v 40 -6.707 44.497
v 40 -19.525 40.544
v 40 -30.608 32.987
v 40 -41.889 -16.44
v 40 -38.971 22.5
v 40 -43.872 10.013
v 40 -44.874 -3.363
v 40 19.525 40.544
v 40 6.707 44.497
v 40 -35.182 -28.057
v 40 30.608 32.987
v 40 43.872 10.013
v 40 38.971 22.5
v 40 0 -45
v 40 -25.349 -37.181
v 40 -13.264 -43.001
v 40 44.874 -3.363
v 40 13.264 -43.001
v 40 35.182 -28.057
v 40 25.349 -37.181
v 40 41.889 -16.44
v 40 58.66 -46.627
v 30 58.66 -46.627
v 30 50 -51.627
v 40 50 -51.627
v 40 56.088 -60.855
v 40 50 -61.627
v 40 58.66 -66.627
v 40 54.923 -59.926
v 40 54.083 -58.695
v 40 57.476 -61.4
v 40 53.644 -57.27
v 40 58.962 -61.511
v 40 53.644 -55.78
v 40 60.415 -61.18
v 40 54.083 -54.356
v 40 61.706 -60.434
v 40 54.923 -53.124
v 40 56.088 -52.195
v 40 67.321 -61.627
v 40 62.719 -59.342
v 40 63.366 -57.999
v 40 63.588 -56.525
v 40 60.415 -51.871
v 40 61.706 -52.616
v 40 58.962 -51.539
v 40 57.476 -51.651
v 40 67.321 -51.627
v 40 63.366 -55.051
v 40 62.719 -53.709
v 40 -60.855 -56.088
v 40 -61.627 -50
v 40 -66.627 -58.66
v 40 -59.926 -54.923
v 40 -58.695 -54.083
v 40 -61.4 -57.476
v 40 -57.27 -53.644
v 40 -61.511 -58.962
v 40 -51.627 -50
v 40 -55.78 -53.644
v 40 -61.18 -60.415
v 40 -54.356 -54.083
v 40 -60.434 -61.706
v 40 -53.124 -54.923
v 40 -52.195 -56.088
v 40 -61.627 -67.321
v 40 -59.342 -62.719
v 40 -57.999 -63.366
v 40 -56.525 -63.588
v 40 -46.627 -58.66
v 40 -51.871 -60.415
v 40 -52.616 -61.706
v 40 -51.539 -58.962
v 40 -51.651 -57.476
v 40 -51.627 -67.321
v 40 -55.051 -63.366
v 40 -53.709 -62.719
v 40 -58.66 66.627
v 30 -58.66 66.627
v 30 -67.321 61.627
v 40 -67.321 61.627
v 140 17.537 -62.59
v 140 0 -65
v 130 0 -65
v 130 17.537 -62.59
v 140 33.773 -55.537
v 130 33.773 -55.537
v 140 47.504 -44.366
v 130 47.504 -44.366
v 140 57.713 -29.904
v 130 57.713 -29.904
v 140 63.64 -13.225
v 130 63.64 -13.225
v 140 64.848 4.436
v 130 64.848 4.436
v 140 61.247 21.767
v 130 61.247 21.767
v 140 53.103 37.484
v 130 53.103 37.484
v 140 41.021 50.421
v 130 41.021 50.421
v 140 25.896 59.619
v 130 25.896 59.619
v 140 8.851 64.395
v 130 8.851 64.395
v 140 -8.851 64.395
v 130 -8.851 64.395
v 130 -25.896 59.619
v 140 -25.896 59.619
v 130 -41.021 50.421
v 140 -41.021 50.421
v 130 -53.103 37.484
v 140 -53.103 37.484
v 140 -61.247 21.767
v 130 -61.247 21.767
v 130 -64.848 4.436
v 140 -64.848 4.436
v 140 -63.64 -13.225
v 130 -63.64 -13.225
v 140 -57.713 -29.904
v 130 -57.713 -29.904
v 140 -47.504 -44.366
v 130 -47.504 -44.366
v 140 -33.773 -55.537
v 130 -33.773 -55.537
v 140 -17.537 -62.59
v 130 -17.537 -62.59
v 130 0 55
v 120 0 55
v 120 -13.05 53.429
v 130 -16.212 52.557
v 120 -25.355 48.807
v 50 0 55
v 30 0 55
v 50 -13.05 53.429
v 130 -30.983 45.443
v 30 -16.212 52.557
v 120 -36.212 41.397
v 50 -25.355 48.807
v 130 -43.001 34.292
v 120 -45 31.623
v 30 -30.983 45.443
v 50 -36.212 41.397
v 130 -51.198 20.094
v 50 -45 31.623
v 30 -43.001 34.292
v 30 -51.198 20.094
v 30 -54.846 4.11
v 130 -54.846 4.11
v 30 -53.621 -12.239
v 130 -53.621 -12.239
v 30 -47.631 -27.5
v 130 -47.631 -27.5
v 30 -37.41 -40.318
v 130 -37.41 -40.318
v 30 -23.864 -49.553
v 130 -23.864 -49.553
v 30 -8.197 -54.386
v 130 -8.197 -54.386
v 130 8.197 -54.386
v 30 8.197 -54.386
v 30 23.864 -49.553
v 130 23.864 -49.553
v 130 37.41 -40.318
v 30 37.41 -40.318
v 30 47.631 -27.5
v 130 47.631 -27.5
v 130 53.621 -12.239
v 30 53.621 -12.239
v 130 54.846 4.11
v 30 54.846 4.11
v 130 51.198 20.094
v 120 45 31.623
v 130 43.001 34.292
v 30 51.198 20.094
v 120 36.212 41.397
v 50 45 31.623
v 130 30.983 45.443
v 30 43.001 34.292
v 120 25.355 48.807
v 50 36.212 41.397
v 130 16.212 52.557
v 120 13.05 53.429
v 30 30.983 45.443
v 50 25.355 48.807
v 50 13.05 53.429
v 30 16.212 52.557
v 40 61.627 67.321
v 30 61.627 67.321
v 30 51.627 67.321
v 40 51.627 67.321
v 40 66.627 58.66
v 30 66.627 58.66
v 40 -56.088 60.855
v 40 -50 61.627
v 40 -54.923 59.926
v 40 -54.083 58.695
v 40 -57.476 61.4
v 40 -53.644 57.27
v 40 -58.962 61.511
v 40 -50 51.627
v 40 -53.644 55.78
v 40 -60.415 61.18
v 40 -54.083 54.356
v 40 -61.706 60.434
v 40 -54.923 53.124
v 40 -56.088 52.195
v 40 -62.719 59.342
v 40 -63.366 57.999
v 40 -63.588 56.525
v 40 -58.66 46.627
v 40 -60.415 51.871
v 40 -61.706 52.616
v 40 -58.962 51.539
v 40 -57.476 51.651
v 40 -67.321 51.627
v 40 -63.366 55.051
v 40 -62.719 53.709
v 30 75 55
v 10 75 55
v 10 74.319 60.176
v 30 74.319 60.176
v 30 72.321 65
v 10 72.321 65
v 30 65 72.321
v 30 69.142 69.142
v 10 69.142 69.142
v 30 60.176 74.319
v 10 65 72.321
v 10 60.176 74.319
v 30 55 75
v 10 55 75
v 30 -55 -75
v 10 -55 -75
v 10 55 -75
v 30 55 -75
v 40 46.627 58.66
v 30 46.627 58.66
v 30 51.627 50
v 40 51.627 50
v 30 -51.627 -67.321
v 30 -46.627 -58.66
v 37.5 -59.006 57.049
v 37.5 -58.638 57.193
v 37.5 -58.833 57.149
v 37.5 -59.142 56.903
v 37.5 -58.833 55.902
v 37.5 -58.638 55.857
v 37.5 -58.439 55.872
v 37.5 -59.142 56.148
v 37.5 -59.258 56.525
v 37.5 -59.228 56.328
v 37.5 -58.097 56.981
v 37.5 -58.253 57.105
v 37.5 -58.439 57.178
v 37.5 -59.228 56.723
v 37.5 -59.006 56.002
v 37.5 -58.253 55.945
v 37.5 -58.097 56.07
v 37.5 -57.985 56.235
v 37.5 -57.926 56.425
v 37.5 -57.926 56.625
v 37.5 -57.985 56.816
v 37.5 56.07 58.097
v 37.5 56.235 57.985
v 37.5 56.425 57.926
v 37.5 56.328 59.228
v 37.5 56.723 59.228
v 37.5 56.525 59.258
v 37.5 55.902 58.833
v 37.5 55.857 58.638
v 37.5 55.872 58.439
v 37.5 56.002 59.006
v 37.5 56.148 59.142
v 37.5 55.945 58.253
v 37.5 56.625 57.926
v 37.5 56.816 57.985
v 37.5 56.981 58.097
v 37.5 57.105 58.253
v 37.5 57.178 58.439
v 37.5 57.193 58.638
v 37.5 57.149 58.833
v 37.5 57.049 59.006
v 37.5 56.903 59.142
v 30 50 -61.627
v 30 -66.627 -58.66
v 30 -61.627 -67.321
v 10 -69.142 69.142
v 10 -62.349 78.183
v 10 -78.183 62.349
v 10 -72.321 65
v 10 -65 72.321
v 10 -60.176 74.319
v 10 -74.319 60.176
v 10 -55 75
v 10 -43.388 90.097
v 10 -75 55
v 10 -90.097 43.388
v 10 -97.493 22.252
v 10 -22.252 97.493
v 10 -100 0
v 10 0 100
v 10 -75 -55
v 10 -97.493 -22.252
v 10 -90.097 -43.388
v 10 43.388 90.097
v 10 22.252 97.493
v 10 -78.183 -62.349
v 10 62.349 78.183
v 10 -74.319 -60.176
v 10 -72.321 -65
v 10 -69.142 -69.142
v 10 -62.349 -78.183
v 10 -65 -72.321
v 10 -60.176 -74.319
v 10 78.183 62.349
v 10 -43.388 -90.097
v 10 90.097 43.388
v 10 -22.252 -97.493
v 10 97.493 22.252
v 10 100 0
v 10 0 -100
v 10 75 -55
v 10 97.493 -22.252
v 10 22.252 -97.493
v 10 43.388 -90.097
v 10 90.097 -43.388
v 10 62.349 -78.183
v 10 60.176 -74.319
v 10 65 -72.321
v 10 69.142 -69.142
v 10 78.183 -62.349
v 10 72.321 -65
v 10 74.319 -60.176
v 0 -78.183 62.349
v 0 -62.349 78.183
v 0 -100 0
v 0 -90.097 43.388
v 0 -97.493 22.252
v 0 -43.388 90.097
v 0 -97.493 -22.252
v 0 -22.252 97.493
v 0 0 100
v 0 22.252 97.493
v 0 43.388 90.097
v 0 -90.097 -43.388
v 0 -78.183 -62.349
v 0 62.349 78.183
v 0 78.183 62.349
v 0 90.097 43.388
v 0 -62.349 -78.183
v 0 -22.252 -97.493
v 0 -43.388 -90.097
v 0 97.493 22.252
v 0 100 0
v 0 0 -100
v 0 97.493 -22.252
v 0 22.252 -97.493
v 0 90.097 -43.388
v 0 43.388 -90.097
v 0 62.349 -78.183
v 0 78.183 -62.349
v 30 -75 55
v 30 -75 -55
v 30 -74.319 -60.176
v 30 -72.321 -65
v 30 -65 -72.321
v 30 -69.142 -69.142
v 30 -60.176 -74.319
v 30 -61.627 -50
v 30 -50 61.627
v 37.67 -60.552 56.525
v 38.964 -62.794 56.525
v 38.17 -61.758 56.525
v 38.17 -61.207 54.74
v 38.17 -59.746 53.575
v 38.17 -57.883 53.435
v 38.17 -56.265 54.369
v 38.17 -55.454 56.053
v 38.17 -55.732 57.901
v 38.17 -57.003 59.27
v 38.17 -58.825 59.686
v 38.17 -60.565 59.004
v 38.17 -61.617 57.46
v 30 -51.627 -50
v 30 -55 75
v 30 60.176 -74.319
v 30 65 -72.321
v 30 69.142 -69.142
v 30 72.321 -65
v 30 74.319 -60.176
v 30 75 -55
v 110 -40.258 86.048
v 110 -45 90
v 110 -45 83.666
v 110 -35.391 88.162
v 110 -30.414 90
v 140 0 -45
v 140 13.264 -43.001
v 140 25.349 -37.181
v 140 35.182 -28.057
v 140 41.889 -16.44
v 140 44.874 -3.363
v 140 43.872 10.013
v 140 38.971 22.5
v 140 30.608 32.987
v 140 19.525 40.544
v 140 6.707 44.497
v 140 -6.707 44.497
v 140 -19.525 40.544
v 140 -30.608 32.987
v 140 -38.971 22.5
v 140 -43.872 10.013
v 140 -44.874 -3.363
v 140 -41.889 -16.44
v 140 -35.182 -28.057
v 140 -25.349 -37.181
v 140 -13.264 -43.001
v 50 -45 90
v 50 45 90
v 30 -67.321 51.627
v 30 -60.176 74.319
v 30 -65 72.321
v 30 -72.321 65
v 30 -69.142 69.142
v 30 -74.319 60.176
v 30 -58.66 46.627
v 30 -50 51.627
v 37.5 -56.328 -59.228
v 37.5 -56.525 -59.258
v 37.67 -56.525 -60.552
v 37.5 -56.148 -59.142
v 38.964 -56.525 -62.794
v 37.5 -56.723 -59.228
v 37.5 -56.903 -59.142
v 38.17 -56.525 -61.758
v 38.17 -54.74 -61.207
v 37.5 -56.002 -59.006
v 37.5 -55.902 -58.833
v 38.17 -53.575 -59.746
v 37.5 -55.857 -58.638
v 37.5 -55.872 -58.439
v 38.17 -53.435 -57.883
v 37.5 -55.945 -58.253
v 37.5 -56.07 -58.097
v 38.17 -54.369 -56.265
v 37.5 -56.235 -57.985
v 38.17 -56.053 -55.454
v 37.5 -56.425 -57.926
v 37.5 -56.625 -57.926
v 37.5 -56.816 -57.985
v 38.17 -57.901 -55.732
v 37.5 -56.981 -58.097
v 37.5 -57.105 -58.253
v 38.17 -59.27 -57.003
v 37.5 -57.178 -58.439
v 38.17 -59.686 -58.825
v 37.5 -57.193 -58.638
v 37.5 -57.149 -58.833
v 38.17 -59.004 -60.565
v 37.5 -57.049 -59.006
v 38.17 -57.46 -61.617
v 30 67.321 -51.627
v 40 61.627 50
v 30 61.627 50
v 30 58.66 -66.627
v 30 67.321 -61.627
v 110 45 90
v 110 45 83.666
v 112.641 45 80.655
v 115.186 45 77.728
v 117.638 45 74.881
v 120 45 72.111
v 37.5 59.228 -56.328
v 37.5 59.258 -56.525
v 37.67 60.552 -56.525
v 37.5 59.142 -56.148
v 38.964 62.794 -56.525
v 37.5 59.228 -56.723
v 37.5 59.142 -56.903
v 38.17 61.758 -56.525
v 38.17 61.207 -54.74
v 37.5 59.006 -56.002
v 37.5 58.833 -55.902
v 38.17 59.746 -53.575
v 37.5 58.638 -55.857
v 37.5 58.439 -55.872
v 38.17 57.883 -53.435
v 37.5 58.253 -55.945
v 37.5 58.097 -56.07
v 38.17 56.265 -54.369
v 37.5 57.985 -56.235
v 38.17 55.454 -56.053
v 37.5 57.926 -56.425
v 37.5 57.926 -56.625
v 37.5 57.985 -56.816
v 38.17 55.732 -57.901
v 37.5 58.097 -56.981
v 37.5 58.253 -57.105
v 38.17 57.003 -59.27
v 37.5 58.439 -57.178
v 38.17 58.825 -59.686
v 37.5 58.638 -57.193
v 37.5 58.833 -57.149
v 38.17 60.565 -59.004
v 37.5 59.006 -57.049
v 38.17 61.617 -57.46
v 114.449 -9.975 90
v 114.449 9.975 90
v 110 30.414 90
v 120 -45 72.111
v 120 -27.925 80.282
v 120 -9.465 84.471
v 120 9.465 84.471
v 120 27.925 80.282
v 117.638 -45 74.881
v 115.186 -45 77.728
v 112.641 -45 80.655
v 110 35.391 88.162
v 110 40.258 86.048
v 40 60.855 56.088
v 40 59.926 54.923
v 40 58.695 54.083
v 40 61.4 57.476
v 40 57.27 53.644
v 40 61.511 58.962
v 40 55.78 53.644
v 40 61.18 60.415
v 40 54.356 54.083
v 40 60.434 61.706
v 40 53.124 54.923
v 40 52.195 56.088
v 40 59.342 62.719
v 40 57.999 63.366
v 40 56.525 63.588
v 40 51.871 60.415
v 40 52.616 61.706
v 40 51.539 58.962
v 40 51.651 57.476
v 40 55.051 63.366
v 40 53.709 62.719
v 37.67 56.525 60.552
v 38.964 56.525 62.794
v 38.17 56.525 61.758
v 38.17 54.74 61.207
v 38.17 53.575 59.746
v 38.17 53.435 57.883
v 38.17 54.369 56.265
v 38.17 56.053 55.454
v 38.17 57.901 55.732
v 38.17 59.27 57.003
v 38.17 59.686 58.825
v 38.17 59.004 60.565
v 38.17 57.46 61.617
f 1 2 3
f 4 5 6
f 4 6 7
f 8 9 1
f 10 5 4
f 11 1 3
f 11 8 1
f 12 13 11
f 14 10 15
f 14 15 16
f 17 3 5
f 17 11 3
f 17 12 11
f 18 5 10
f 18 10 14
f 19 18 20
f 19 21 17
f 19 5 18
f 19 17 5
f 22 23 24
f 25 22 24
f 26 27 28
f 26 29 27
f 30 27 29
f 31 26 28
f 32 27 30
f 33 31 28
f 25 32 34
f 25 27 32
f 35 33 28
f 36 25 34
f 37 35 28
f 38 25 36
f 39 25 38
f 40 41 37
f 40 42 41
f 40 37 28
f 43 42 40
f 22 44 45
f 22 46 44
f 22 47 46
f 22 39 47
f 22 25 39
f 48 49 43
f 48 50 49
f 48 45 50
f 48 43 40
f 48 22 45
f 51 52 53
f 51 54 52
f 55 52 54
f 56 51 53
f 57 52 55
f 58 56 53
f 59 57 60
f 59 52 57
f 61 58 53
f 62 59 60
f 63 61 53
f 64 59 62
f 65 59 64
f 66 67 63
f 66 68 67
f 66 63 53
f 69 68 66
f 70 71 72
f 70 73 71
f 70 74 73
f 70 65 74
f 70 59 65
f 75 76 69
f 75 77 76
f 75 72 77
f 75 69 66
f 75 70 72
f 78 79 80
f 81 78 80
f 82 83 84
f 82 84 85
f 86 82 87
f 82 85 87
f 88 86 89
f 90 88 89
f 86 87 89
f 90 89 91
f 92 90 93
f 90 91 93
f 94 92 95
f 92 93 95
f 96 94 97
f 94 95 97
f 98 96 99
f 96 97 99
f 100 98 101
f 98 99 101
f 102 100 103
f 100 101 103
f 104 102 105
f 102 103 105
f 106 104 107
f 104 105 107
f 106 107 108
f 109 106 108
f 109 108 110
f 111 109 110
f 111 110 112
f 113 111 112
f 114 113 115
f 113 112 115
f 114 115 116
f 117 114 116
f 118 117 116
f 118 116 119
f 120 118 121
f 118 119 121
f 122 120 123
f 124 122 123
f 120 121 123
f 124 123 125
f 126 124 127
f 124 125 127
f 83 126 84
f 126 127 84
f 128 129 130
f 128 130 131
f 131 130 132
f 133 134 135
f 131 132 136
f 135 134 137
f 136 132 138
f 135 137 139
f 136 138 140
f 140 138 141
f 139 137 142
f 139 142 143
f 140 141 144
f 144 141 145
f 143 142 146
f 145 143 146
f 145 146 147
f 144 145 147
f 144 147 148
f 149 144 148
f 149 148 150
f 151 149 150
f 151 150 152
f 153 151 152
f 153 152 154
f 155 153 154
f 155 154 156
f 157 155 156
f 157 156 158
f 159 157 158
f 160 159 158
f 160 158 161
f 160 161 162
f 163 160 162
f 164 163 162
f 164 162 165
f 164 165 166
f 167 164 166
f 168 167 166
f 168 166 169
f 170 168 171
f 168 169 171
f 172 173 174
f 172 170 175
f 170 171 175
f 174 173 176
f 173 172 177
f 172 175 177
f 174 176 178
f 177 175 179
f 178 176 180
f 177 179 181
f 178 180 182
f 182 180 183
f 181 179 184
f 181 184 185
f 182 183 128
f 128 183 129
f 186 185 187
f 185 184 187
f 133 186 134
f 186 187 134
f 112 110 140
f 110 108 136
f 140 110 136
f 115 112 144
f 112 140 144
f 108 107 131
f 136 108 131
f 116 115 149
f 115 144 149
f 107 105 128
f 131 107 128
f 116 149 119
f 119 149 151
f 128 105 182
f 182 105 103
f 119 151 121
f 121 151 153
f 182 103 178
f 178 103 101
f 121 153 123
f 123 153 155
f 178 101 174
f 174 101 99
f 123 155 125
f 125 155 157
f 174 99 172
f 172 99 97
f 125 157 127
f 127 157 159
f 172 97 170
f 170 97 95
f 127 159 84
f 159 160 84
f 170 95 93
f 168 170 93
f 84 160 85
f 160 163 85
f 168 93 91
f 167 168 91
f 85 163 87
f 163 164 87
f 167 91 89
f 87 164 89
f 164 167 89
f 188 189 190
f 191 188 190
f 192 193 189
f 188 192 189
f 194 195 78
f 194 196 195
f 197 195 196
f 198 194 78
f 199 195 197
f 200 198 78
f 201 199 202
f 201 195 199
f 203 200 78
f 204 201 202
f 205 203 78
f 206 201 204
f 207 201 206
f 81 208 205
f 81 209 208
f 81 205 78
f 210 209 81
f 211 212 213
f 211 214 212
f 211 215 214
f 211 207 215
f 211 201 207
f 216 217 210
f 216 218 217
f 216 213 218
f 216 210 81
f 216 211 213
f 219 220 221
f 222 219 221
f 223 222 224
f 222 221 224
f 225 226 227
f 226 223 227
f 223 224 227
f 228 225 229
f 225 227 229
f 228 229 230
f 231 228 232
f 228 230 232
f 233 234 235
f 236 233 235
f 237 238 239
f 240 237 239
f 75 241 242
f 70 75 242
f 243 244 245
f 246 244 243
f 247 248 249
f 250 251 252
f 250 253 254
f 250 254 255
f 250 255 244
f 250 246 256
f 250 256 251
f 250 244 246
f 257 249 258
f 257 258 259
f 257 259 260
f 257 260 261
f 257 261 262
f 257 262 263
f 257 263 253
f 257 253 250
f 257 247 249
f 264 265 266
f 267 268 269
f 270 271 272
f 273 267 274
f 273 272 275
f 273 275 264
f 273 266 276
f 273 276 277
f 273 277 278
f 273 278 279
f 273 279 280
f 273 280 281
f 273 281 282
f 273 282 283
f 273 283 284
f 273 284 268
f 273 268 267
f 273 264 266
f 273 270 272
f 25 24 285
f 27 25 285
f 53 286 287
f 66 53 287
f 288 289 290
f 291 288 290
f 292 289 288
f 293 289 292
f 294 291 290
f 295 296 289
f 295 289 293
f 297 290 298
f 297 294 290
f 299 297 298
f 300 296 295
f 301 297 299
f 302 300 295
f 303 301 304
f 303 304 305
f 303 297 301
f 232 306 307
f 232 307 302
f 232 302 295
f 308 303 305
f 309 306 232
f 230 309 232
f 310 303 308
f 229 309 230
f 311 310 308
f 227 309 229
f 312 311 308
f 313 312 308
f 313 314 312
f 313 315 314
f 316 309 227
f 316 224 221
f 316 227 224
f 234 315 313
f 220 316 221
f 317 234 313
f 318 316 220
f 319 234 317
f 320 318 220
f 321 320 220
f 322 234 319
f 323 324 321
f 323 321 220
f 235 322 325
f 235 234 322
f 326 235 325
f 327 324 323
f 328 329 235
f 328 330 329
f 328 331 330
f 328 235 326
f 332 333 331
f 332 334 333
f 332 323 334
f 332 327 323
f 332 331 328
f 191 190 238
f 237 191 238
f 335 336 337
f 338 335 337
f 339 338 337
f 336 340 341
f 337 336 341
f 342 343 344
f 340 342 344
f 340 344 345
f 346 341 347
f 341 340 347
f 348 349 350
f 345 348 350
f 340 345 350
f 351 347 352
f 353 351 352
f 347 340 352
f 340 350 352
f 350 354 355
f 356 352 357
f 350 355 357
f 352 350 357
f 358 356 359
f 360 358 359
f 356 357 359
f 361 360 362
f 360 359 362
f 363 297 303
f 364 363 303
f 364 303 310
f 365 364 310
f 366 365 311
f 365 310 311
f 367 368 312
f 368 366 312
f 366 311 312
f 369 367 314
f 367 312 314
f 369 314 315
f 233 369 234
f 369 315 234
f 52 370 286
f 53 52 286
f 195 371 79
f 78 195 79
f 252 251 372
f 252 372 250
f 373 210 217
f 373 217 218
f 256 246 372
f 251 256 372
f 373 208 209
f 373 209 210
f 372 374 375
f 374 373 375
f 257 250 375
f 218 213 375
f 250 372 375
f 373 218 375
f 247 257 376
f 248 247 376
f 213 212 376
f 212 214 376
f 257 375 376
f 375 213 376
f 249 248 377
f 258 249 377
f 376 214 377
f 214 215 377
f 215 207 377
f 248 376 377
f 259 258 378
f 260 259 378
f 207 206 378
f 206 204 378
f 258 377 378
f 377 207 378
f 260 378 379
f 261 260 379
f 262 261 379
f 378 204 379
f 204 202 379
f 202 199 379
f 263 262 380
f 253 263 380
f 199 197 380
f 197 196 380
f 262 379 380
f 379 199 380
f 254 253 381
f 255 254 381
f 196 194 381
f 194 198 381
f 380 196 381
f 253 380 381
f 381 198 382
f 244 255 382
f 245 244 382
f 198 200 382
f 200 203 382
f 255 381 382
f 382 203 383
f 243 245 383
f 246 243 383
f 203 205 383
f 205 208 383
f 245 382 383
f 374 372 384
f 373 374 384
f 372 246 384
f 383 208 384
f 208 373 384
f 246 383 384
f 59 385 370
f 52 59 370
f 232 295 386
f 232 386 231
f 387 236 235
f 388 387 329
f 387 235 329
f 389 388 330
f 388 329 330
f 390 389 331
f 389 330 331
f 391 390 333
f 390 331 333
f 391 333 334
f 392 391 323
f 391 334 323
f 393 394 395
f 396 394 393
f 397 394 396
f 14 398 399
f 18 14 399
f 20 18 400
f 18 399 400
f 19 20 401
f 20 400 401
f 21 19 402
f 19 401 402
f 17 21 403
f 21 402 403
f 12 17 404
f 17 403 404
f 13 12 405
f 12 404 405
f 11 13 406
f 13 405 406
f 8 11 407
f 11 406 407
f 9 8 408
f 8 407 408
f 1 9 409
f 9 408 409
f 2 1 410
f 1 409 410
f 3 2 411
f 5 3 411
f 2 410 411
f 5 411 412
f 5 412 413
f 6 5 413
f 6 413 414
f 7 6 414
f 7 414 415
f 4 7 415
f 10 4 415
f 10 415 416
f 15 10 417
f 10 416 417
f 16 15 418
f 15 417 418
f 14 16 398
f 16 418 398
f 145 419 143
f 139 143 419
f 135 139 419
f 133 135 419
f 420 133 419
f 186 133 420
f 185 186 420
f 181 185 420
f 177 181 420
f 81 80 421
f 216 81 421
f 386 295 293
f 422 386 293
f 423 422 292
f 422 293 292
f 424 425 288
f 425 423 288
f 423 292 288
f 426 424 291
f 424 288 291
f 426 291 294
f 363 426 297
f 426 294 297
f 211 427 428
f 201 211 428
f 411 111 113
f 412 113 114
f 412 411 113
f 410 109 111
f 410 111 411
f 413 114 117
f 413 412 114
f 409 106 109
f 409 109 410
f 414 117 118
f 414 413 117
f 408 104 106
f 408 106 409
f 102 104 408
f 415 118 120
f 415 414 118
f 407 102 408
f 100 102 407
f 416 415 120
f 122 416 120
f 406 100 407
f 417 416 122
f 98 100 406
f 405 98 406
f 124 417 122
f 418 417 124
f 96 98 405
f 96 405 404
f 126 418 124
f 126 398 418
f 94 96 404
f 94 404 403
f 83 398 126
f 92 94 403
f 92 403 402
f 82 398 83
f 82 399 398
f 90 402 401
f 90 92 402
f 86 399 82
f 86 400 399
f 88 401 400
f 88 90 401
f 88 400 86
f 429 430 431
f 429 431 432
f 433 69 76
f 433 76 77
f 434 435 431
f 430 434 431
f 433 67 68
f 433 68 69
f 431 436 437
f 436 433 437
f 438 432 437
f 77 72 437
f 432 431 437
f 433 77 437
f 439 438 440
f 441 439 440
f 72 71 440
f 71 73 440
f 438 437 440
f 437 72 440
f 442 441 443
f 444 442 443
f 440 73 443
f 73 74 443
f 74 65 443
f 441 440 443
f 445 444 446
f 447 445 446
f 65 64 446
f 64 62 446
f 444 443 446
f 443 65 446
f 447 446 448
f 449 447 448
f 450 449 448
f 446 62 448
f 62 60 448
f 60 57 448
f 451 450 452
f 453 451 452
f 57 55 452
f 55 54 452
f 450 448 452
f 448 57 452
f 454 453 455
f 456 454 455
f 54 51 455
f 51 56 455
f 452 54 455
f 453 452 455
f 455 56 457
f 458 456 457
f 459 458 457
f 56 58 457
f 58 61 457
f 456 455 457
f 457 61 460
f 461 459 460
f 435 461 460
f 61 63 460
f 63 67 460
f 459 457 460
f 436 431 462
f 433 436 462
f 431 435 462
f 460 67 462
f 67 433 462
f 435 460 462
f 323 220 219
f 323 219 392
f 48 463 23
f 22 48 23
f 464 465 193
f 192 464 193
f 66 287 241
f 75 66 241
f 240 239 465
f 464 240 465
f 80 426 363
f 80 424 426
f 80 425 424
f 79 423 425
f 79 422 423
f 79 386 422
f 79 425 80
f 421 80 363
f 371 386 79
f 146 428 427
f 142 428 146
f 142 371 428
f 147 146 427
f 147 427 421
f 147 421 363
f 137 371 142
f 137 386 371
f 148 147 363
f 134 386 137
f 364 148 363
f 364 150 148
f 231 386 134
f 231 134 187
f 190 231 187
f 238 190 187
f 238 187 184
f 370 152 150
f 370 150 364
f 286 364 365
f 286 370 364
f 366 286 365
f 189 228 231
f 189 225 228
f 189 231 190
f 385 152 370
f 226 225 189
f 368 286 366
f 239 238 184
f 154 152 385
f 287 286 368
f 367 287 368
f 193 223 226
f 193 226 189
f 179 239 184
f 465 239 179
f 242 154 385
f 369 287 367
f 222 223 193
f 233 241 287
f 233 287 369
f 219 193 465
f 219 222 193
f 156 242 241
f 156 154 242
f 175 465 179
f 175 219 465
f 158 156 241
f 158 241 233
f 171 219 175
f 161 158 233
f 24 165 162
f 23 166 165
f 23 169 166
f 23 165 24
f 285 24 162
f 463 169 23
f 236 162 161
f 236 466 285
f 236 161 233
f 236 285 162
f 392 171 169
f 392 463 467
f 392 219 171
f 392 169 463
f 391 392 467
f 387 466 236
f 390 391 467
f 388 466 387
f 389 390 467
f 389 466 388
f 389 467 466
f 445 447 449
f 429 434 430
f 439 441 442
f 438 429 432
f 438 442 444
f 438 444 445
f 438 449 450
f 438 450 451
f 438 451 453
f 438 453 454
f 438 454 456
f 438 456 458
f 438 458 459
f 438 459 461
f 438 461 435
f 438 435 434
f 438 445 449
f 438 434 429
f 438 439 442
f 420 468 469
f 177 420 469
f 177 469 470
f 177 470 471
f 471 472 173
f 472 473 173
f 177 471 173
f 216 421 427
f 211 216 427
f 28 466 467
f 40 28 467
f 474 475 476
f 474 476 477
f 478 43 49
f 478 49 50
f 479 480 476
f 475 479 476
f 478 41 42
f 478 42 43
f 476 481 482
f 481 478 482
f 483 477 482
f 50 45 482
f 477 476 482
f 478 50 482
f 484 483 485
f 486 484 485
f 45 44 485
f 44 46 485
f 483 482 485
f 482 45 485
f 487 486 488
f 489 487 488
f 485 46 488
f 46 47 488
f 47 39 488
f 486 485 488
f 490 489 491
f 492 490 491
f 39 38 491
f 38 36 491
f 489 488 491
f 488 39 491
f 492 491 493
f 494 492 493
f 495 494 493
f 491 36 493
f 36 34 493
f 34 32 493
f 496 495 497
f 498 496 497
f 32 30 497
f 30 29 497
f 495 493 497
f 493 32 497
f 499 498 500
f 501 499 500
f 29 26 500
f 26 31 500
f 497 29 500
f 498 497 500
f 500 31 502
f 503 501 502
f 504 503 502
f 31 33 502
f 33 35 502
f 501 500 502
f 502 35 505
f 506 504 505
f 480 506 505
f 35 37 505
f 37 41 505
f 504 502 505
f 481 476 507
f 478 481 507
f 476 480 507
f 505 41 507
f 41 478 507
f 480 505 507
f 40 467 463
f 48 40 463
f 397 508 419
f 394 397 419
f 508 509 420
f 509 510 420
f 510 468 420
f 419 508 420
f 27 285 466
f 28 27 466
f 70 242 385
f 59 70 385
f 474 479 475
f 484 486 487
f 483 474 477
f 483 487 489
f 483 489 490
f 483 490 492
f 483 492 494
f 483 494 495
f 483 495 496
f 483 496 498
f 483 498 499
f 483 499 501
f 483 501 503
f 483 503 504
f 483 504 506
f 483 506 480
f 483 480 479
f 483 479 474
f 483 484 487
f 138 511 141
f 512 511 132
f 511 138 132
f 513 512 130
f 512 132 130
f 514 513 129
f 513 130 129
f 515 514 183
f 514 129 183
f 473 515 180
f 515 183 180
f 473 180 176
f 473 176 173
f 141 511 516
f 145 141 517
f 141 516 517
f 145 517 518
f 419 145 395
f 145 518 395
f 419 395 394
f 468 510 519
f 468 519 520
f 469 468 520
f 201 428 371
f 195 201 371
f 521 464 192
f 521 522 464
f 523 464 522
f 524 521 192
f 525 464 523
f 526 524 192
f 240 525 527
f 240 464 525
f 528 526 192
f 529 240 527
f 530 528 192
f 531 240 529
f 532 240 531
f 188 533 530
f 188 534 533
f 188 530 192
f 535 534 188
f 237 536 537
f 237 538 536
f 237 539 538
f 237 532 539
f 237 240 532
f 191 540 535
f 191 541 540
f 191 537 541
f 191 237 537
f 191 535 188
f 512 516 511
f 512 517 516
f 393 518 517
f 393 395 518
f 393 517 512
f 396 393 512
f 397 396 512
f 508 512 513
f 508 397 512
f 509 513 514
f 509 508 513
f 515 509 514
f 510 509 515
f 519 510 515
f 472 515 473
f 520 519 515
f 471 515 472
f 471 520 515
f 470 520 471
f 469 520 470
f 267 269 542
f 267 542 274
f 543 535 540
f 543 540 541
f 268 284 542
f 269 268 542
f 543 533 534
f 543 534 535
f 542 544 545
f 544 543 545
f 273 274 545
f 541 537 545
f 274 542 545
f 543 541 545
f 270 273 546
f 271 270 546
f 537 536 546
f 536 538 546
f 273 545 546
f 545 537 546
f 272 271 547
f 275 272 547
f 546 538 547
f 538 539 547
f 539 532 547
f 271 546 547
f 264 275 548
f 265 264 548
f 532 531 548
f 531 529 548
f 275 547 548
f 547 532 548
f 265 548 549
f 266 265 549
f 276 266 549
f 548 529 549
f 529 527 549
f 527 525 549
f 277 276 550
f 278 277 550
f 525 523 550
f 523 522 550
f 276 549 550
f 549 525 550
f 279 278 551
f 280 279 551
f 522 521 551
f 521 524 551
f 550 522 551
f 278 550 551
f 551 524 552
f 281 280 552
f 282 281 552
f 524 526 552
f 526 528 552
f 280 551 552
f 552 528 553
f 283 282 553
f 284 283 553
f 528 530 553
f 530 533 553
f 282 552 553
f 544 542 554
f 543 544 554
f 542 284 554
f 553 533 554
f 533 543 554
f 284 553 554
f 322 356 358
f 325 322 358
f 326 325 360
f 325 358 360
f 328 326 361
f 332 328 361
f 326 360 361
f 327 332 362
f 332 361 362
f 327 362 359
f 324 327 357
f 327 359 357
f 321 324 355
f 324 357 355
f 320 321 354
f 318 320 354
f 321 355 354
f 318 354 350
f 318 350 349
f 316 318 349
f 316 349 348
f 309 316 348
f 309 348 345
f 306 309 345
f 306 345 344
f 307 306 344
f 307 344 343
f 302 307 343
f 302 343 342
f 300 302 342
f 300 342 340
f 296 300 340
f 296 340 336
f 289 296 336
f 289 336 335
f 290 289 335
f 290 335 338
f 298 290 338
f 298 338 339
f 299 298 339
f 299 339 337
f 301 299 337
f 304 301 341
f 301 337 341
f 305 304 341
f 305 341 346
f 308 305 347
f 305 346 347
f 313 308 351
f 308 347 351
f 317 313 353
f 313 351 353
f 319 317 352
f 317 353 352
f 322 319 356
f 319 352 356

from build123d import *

# Parameters (mm, degrees)
SKETCH1_R                = 100
BOSS_EXTRUDE1_DEPTH      = 10
SKETCH2_W                = 150
SKETCH2_H                = 150
BOSS_EXTRUDE2_DEPTH      = 20
FILLET1_R                = 20
SKETCH3_R                = 55
BOSS_EXTRUDE3_DEPTH      = 100
SKETCH4_R                = 65
BOSS_EXTRUDE4_DEPTH      = 10
SKETCH5_W                = 70
SKETCH5_H                = 90
BOSS_EXTRUDE5_DEPTH      = 90
CUT_EXTRUDE1_DEPTH       = 10
CHAMFER1_SIZE            = 10
SKETCH7_R                = 45
CUT_EXTRUDE2_DEPTH       = 100
BOSS_EXTRUDE6_DEPTH      = 10
SKETCH9_R                = 5
CUT_EXTRUDE3_DEPTH       = 2.5
FILLET9_R                = 5
CIRPATTERN1_COUNT        = 4
FILLET9_OF_CIRPATTERN1_R = 5


with BuildPart() as part:
    # Sketch1 → Boss-Extrude1 (new body)
    with BuildSketch(Plane(origin=(0, 0, 0), x_dir=(0, 0, -1), z_dir=(1, 0, 0))):
        Circle(SKETCH1_R)
    extrude(amount=BOSS_EXTRUDE1_DEPTH)

    # Sketch2 → Boss-Extrude2 (add)
    with BuildSketch(Plane(origin=(10, 0, 0), x_dir=(0, 0, -1), z_dir=(1, 0, 0))):
        Rectangle(SKETCH2_W, SKETCH2_H)
    extrude(amount=BOSS_EXTRUDE2_DEPTH)

    # Fillet1
    # the kernel refuses this fillet: 20 mm, written as the material it takes off along each edge
    with BuildSketch(Plane(origin=(10, -75, -75), x_dir=(0, 1, 0), z_dir=(1, 0, 0)), Plane(origin=(10, 75, 75), x_dir=(0, -1, 0), z_dir=(1, 0, 0)), Plane(origin=(10, -75, 75), x_dir=(0, 0, -1), z_dir=(1, 0, 0))) as fillet1_piece_1:
        with BuildLine():
            CenterArc((FILLET1_R, FILLET1_R), FILLET1_R, 180, 90)
            Line((0, FILLET1_R), (0, 0))
            Line((0, 0), (FILLET1_R, 0))
        make_face()
    extrude(amount=70, mode=Mode.SUBTRACT)
    with BuildSketch(Plane(origin=(10, 75, -75), x_dir=(0, -1, 0), z_dir=(1, 0, 0))) as fillet1_piece_2:
        with BuildLine():
            CenterArc((FILLET1_R, -FILLET1_R), FILLET1_R, 90, 90)
            Line((0, -FILLET1_R), (0, 0))
            Line((0, 0), (FILLET1_R, 0))
        make_face()
    extrude(amount=70, mode=Mode.SUBTRACT)

    # Sketch3 → Boss-Extrude3 (add)
    with BuildSketch(Plane(origin=(30, 0, 0), x_dir=(0, 0, -1), z_dir=(1, 0, 0))):
        with Locations(Location((0, 0, 0), (0, 0, 180))):
            Circle(SKETCH3_R)
    extrude(amount=BOSS_EXTRUDE3_DEPTH)

    # Sketch4 → Boss-Extrude4 (add)
    with BuildSketch(Plane(origin=(130, 0, 0), x_dir=(0, 0, -1), z_dir=(1, 0, 0))):
        Circle(SKETCH4_R)
    extrude(amount=BOSS_EXTRUDE4_DEPTH)

    # Sketch5 → Boss-Extrude5 (add)
    with BuildSketch(Plane.XY):
        with Locations((85, 0)):
            Rectangle(SKETCH5_W, SKETCH5_H)
    extrude(amount=BOSS_EXTRUDE5_DEPTH)

    # Sketch6 → Cut-Extrude1 (cut)
    with BuildSketch(Plane(origin=(120, 0, 0), x_dir=(0, 0, -1), z_dir=(1, 0, 0))):
        with BuildLine():
            Line((-90, -45), (-72.111025509, -45))
            ThreePointArc((-72.111025509, -45), (-85, 0), (-72.111025509, 45))
            Line((-72.111025509, 45), (-90, 45))
            Line((-90, 45), (-90, -45))
        make_face()
    extrude(amount=-CUT_EXTRUDE1_DEPTH, mode=Mode.SUBTRACT)

    # Chamfer1
    # the kernel refuses this chamfer: 10 mm, written as the material it adds along each edge
    with BuildSketch(Plane(origin=(110, 0, 0), x_dir=(0, -0.7581812704151473, 0.6520438337962206), z_dir=(0, -0.6520438337962206, -0.7581812704151473))) as chamfer1_piece_1_section:
        Polygon((85, -CHAMFER1_SIZE), (85 + CHAMFER1_SIZE, 0), (85, 0), align=None)
    chamfer1_piece_1 = revolve(axis=Axis((110, 0, 0), (-1, 0, 0)), revolution_arc=98.608247973, mode=Mode.PRIVATE)
    chamfer1_piece_1 = split(chamfer1_piece_1, bisect_by=Plane(origin=(118.167671654, 45, 80.674313719), z_dir=(0, -1, 0)), keep=Keep.TOP, mode=Mode.PRIVATE)
    chamfer1_piece_1 = split(chamfer1_piece_1, bisect_by=Plane(origin=(120, -31.470599687, 80.674313719), z_dir=(-1, 0, 0)), keep=Keep.TOP, mode=Mode.PRIVATE)
    chamfer1_piece_1 = split(chamfer1_piece_1, bisect_by=Plane(origin=(118.167671654, -45, 80.674313719), z_dir=(0, 1, 0)), keep=Keep.TOP, mode=Mode.PRIVATE)
    chamfer1_piece_1 = split(chamfer1_piece_1, bisect_by=Plane(origin=(118.167671654, -31.470599687, 90), z_dir=(0, 0, -1)), keep=Keep.TOP, mode=Mode.PRIVATE)
    add(chamfer1_piece_1)

    # Sketch7 → Cut-Extrude2 (cut)
    with BuildSketch(Plane(origin=(140, 0, 0), x_dir=(0, 0, -1), z_dir=(1, 0, 0))):
        Circle(SKETCH7_R)
    extrude(amount=-CUT_EXTRUDE2_DEPTH, mode=Mode.SUBTRACT)

    # Sketch8 → Boss-Extrude6 (add)
    with BuildSketch(Plane(origin=(30, 0, 0), x_dir=(0, 0, -1), z_dir=(1, 0, 0))):
        Polygon((67.320508076, -61.627449546), (67.320508076, -51.627449546), (58.660254038, -46.627449546), (50, -51.627449546), (50, -61.627449546), (58.660254038, -66.627449546), align=None)
    boss_extrude6 = extrude(amount=BOSS_EXTRUDE6_DEPTH)

    # Sketch9 → Cut-Extrude3 (cut)
    with BuildSketch(Plane(origin=(40, 0, 0), x_dir=(0, 0, -1), z_dir=(1, 0, 0))):
        with Locations((58.588222401, -56.525256823)):
            Circle(SKETCH9_R)
    cut_extrude3 = extrude(amount=-CUT_EXTRUDE3_DEPTH, mode=Mode.SUBTRACT)

    # Fillet9
    # the kernel refuses this fillet: 5 mm, written as the material it adds along each edge
    with BuildSketch(Plane(origin=(37.5, -56.525256823, -58.588222401), x_dir=(0, 0, -1), z_dir=(0, -1, 0))) as fillet9_piece_1:
        with BuildLine():
            CenterArc((0.669872981, 5), FILLET9_R, 270, 60)
            Line((0.669872981, 0), (0.669872981, -0.1))
            Line((0.669872981, -0.1), (5, -0.1))
            Line((5, -0.1), (5.1, 0))
            ThreePointArc((5.1, 0), (5.1, 1.25), (5.08660254, 2.45))
            Line((5.08660254, 2.45), (5, 2.5))
        make_face()
    revolve(axis=Axis((37.5, -56.525256823, -58.588222401), (1, 0, 0)))

    # CirPattern1: Boss-Extrude6, Cut-Extrude3 ×4 about axis
    cirpattern1_axis = Axis((0, 0, 0), (1, 0, 0))
    add([boss_extrude6.rotate(cirpattern1_axis, i * 360 / CIRPATTERN1_COUNT) for i in range(1, CIRPATTERN1_COUNT)])
    add([cut_extrude3.rotate(cirpattern1_axis, i * 360 / CIRPATTERN1_COUNT) for i in range(1, CIRPATTERN1_COUNT)], mode=Mode.SUBTRACT)

    # Fillet9 of CirPattern1
    # the kernel refuses this fillet: 5 mm, written as the material it adds along each edge
    with BuildSketch(Plane(origin=(37.5, 58.588222401, -56.525256823), x_dir=(0, 1, 0), z_dir=(0, 0, -1))) as fillet9_of_cirpattern1_piece_1:
        with BuildLine():
            CenterArc((0.669872981, 5), FILLET9_OF_CIRPATTERN1_R, 270, 60)
            Line((0.669872981, 0), (0.669872981, -0.1))
            Line((0.669872981, -0.1), (5, -0.1))
            Line((5, -0.1), (5.1, 0))
            ThreePointArc((5.1, 0), (5.1, 1.25), (5.08660254, 2.45))
            Line((5.08660254, 2.45), (5, 2.5))
        make_face()
    revolve(axis=Axis((37.5, 58.588222401, -56.525256823), (1, 0, 0)))
    with BuildSketch(Plane(origin=(37.5, 56.525256823, 58.588222401), x_dir=(0, 0, 1), z_dir=(0, 1, 0))) as fillet9_of_cirpattern1_piece_2:
        with BuildLine():
            CenterArc((0.669872981, 5), FILLET9_OF_CIRPATTERN1_R, 270, 60)
            Line((0.669872981, 0), (0.669872981, -0.1))
            Line((0.669872981, -0.1), (5, -0.1))
            Line((5, -0.1), (5.1, 0))
            ThreePointArc((5.1, 0), (5.1, 1.25), (5.08660254, 2.45))
            Line((5.08660254, 2.45), (5, 2.5))
        make_face()
    revolve(axis=Axis((37.5, 56.525256823, 58.588222401), (1, 0, 0)))
    with BuildSketch(Plane(origin=(37.5, -58.588222401, 56.525256823), x_dir=(0, -1, 0), z_dir=(0, 0, 1))) as fillet9_of_cirpattern1_piece_3:
        with BuildLine():
            CenterArc((0.669872981, 5), FILLET9_OF_CIRPATTERN1_R, 270, 60)
            Line((0.669872981, 0), (0.669872981, -0.1))
            Line((0.669872981, -0.1), (5, -0.1))
            Line((5, -0.1), (5.1, 0))
            ThreePointArc((5.1, 0), (5.1, 1.25), (5.08660254, 2.45))
            Line((5.08660254, 2.45), (5, 2.5))
        make_face()
    revolve(axis=Axis((37.5, -58.588222401, 56.525256823), (1, 0, 0)))


solid = part.part
